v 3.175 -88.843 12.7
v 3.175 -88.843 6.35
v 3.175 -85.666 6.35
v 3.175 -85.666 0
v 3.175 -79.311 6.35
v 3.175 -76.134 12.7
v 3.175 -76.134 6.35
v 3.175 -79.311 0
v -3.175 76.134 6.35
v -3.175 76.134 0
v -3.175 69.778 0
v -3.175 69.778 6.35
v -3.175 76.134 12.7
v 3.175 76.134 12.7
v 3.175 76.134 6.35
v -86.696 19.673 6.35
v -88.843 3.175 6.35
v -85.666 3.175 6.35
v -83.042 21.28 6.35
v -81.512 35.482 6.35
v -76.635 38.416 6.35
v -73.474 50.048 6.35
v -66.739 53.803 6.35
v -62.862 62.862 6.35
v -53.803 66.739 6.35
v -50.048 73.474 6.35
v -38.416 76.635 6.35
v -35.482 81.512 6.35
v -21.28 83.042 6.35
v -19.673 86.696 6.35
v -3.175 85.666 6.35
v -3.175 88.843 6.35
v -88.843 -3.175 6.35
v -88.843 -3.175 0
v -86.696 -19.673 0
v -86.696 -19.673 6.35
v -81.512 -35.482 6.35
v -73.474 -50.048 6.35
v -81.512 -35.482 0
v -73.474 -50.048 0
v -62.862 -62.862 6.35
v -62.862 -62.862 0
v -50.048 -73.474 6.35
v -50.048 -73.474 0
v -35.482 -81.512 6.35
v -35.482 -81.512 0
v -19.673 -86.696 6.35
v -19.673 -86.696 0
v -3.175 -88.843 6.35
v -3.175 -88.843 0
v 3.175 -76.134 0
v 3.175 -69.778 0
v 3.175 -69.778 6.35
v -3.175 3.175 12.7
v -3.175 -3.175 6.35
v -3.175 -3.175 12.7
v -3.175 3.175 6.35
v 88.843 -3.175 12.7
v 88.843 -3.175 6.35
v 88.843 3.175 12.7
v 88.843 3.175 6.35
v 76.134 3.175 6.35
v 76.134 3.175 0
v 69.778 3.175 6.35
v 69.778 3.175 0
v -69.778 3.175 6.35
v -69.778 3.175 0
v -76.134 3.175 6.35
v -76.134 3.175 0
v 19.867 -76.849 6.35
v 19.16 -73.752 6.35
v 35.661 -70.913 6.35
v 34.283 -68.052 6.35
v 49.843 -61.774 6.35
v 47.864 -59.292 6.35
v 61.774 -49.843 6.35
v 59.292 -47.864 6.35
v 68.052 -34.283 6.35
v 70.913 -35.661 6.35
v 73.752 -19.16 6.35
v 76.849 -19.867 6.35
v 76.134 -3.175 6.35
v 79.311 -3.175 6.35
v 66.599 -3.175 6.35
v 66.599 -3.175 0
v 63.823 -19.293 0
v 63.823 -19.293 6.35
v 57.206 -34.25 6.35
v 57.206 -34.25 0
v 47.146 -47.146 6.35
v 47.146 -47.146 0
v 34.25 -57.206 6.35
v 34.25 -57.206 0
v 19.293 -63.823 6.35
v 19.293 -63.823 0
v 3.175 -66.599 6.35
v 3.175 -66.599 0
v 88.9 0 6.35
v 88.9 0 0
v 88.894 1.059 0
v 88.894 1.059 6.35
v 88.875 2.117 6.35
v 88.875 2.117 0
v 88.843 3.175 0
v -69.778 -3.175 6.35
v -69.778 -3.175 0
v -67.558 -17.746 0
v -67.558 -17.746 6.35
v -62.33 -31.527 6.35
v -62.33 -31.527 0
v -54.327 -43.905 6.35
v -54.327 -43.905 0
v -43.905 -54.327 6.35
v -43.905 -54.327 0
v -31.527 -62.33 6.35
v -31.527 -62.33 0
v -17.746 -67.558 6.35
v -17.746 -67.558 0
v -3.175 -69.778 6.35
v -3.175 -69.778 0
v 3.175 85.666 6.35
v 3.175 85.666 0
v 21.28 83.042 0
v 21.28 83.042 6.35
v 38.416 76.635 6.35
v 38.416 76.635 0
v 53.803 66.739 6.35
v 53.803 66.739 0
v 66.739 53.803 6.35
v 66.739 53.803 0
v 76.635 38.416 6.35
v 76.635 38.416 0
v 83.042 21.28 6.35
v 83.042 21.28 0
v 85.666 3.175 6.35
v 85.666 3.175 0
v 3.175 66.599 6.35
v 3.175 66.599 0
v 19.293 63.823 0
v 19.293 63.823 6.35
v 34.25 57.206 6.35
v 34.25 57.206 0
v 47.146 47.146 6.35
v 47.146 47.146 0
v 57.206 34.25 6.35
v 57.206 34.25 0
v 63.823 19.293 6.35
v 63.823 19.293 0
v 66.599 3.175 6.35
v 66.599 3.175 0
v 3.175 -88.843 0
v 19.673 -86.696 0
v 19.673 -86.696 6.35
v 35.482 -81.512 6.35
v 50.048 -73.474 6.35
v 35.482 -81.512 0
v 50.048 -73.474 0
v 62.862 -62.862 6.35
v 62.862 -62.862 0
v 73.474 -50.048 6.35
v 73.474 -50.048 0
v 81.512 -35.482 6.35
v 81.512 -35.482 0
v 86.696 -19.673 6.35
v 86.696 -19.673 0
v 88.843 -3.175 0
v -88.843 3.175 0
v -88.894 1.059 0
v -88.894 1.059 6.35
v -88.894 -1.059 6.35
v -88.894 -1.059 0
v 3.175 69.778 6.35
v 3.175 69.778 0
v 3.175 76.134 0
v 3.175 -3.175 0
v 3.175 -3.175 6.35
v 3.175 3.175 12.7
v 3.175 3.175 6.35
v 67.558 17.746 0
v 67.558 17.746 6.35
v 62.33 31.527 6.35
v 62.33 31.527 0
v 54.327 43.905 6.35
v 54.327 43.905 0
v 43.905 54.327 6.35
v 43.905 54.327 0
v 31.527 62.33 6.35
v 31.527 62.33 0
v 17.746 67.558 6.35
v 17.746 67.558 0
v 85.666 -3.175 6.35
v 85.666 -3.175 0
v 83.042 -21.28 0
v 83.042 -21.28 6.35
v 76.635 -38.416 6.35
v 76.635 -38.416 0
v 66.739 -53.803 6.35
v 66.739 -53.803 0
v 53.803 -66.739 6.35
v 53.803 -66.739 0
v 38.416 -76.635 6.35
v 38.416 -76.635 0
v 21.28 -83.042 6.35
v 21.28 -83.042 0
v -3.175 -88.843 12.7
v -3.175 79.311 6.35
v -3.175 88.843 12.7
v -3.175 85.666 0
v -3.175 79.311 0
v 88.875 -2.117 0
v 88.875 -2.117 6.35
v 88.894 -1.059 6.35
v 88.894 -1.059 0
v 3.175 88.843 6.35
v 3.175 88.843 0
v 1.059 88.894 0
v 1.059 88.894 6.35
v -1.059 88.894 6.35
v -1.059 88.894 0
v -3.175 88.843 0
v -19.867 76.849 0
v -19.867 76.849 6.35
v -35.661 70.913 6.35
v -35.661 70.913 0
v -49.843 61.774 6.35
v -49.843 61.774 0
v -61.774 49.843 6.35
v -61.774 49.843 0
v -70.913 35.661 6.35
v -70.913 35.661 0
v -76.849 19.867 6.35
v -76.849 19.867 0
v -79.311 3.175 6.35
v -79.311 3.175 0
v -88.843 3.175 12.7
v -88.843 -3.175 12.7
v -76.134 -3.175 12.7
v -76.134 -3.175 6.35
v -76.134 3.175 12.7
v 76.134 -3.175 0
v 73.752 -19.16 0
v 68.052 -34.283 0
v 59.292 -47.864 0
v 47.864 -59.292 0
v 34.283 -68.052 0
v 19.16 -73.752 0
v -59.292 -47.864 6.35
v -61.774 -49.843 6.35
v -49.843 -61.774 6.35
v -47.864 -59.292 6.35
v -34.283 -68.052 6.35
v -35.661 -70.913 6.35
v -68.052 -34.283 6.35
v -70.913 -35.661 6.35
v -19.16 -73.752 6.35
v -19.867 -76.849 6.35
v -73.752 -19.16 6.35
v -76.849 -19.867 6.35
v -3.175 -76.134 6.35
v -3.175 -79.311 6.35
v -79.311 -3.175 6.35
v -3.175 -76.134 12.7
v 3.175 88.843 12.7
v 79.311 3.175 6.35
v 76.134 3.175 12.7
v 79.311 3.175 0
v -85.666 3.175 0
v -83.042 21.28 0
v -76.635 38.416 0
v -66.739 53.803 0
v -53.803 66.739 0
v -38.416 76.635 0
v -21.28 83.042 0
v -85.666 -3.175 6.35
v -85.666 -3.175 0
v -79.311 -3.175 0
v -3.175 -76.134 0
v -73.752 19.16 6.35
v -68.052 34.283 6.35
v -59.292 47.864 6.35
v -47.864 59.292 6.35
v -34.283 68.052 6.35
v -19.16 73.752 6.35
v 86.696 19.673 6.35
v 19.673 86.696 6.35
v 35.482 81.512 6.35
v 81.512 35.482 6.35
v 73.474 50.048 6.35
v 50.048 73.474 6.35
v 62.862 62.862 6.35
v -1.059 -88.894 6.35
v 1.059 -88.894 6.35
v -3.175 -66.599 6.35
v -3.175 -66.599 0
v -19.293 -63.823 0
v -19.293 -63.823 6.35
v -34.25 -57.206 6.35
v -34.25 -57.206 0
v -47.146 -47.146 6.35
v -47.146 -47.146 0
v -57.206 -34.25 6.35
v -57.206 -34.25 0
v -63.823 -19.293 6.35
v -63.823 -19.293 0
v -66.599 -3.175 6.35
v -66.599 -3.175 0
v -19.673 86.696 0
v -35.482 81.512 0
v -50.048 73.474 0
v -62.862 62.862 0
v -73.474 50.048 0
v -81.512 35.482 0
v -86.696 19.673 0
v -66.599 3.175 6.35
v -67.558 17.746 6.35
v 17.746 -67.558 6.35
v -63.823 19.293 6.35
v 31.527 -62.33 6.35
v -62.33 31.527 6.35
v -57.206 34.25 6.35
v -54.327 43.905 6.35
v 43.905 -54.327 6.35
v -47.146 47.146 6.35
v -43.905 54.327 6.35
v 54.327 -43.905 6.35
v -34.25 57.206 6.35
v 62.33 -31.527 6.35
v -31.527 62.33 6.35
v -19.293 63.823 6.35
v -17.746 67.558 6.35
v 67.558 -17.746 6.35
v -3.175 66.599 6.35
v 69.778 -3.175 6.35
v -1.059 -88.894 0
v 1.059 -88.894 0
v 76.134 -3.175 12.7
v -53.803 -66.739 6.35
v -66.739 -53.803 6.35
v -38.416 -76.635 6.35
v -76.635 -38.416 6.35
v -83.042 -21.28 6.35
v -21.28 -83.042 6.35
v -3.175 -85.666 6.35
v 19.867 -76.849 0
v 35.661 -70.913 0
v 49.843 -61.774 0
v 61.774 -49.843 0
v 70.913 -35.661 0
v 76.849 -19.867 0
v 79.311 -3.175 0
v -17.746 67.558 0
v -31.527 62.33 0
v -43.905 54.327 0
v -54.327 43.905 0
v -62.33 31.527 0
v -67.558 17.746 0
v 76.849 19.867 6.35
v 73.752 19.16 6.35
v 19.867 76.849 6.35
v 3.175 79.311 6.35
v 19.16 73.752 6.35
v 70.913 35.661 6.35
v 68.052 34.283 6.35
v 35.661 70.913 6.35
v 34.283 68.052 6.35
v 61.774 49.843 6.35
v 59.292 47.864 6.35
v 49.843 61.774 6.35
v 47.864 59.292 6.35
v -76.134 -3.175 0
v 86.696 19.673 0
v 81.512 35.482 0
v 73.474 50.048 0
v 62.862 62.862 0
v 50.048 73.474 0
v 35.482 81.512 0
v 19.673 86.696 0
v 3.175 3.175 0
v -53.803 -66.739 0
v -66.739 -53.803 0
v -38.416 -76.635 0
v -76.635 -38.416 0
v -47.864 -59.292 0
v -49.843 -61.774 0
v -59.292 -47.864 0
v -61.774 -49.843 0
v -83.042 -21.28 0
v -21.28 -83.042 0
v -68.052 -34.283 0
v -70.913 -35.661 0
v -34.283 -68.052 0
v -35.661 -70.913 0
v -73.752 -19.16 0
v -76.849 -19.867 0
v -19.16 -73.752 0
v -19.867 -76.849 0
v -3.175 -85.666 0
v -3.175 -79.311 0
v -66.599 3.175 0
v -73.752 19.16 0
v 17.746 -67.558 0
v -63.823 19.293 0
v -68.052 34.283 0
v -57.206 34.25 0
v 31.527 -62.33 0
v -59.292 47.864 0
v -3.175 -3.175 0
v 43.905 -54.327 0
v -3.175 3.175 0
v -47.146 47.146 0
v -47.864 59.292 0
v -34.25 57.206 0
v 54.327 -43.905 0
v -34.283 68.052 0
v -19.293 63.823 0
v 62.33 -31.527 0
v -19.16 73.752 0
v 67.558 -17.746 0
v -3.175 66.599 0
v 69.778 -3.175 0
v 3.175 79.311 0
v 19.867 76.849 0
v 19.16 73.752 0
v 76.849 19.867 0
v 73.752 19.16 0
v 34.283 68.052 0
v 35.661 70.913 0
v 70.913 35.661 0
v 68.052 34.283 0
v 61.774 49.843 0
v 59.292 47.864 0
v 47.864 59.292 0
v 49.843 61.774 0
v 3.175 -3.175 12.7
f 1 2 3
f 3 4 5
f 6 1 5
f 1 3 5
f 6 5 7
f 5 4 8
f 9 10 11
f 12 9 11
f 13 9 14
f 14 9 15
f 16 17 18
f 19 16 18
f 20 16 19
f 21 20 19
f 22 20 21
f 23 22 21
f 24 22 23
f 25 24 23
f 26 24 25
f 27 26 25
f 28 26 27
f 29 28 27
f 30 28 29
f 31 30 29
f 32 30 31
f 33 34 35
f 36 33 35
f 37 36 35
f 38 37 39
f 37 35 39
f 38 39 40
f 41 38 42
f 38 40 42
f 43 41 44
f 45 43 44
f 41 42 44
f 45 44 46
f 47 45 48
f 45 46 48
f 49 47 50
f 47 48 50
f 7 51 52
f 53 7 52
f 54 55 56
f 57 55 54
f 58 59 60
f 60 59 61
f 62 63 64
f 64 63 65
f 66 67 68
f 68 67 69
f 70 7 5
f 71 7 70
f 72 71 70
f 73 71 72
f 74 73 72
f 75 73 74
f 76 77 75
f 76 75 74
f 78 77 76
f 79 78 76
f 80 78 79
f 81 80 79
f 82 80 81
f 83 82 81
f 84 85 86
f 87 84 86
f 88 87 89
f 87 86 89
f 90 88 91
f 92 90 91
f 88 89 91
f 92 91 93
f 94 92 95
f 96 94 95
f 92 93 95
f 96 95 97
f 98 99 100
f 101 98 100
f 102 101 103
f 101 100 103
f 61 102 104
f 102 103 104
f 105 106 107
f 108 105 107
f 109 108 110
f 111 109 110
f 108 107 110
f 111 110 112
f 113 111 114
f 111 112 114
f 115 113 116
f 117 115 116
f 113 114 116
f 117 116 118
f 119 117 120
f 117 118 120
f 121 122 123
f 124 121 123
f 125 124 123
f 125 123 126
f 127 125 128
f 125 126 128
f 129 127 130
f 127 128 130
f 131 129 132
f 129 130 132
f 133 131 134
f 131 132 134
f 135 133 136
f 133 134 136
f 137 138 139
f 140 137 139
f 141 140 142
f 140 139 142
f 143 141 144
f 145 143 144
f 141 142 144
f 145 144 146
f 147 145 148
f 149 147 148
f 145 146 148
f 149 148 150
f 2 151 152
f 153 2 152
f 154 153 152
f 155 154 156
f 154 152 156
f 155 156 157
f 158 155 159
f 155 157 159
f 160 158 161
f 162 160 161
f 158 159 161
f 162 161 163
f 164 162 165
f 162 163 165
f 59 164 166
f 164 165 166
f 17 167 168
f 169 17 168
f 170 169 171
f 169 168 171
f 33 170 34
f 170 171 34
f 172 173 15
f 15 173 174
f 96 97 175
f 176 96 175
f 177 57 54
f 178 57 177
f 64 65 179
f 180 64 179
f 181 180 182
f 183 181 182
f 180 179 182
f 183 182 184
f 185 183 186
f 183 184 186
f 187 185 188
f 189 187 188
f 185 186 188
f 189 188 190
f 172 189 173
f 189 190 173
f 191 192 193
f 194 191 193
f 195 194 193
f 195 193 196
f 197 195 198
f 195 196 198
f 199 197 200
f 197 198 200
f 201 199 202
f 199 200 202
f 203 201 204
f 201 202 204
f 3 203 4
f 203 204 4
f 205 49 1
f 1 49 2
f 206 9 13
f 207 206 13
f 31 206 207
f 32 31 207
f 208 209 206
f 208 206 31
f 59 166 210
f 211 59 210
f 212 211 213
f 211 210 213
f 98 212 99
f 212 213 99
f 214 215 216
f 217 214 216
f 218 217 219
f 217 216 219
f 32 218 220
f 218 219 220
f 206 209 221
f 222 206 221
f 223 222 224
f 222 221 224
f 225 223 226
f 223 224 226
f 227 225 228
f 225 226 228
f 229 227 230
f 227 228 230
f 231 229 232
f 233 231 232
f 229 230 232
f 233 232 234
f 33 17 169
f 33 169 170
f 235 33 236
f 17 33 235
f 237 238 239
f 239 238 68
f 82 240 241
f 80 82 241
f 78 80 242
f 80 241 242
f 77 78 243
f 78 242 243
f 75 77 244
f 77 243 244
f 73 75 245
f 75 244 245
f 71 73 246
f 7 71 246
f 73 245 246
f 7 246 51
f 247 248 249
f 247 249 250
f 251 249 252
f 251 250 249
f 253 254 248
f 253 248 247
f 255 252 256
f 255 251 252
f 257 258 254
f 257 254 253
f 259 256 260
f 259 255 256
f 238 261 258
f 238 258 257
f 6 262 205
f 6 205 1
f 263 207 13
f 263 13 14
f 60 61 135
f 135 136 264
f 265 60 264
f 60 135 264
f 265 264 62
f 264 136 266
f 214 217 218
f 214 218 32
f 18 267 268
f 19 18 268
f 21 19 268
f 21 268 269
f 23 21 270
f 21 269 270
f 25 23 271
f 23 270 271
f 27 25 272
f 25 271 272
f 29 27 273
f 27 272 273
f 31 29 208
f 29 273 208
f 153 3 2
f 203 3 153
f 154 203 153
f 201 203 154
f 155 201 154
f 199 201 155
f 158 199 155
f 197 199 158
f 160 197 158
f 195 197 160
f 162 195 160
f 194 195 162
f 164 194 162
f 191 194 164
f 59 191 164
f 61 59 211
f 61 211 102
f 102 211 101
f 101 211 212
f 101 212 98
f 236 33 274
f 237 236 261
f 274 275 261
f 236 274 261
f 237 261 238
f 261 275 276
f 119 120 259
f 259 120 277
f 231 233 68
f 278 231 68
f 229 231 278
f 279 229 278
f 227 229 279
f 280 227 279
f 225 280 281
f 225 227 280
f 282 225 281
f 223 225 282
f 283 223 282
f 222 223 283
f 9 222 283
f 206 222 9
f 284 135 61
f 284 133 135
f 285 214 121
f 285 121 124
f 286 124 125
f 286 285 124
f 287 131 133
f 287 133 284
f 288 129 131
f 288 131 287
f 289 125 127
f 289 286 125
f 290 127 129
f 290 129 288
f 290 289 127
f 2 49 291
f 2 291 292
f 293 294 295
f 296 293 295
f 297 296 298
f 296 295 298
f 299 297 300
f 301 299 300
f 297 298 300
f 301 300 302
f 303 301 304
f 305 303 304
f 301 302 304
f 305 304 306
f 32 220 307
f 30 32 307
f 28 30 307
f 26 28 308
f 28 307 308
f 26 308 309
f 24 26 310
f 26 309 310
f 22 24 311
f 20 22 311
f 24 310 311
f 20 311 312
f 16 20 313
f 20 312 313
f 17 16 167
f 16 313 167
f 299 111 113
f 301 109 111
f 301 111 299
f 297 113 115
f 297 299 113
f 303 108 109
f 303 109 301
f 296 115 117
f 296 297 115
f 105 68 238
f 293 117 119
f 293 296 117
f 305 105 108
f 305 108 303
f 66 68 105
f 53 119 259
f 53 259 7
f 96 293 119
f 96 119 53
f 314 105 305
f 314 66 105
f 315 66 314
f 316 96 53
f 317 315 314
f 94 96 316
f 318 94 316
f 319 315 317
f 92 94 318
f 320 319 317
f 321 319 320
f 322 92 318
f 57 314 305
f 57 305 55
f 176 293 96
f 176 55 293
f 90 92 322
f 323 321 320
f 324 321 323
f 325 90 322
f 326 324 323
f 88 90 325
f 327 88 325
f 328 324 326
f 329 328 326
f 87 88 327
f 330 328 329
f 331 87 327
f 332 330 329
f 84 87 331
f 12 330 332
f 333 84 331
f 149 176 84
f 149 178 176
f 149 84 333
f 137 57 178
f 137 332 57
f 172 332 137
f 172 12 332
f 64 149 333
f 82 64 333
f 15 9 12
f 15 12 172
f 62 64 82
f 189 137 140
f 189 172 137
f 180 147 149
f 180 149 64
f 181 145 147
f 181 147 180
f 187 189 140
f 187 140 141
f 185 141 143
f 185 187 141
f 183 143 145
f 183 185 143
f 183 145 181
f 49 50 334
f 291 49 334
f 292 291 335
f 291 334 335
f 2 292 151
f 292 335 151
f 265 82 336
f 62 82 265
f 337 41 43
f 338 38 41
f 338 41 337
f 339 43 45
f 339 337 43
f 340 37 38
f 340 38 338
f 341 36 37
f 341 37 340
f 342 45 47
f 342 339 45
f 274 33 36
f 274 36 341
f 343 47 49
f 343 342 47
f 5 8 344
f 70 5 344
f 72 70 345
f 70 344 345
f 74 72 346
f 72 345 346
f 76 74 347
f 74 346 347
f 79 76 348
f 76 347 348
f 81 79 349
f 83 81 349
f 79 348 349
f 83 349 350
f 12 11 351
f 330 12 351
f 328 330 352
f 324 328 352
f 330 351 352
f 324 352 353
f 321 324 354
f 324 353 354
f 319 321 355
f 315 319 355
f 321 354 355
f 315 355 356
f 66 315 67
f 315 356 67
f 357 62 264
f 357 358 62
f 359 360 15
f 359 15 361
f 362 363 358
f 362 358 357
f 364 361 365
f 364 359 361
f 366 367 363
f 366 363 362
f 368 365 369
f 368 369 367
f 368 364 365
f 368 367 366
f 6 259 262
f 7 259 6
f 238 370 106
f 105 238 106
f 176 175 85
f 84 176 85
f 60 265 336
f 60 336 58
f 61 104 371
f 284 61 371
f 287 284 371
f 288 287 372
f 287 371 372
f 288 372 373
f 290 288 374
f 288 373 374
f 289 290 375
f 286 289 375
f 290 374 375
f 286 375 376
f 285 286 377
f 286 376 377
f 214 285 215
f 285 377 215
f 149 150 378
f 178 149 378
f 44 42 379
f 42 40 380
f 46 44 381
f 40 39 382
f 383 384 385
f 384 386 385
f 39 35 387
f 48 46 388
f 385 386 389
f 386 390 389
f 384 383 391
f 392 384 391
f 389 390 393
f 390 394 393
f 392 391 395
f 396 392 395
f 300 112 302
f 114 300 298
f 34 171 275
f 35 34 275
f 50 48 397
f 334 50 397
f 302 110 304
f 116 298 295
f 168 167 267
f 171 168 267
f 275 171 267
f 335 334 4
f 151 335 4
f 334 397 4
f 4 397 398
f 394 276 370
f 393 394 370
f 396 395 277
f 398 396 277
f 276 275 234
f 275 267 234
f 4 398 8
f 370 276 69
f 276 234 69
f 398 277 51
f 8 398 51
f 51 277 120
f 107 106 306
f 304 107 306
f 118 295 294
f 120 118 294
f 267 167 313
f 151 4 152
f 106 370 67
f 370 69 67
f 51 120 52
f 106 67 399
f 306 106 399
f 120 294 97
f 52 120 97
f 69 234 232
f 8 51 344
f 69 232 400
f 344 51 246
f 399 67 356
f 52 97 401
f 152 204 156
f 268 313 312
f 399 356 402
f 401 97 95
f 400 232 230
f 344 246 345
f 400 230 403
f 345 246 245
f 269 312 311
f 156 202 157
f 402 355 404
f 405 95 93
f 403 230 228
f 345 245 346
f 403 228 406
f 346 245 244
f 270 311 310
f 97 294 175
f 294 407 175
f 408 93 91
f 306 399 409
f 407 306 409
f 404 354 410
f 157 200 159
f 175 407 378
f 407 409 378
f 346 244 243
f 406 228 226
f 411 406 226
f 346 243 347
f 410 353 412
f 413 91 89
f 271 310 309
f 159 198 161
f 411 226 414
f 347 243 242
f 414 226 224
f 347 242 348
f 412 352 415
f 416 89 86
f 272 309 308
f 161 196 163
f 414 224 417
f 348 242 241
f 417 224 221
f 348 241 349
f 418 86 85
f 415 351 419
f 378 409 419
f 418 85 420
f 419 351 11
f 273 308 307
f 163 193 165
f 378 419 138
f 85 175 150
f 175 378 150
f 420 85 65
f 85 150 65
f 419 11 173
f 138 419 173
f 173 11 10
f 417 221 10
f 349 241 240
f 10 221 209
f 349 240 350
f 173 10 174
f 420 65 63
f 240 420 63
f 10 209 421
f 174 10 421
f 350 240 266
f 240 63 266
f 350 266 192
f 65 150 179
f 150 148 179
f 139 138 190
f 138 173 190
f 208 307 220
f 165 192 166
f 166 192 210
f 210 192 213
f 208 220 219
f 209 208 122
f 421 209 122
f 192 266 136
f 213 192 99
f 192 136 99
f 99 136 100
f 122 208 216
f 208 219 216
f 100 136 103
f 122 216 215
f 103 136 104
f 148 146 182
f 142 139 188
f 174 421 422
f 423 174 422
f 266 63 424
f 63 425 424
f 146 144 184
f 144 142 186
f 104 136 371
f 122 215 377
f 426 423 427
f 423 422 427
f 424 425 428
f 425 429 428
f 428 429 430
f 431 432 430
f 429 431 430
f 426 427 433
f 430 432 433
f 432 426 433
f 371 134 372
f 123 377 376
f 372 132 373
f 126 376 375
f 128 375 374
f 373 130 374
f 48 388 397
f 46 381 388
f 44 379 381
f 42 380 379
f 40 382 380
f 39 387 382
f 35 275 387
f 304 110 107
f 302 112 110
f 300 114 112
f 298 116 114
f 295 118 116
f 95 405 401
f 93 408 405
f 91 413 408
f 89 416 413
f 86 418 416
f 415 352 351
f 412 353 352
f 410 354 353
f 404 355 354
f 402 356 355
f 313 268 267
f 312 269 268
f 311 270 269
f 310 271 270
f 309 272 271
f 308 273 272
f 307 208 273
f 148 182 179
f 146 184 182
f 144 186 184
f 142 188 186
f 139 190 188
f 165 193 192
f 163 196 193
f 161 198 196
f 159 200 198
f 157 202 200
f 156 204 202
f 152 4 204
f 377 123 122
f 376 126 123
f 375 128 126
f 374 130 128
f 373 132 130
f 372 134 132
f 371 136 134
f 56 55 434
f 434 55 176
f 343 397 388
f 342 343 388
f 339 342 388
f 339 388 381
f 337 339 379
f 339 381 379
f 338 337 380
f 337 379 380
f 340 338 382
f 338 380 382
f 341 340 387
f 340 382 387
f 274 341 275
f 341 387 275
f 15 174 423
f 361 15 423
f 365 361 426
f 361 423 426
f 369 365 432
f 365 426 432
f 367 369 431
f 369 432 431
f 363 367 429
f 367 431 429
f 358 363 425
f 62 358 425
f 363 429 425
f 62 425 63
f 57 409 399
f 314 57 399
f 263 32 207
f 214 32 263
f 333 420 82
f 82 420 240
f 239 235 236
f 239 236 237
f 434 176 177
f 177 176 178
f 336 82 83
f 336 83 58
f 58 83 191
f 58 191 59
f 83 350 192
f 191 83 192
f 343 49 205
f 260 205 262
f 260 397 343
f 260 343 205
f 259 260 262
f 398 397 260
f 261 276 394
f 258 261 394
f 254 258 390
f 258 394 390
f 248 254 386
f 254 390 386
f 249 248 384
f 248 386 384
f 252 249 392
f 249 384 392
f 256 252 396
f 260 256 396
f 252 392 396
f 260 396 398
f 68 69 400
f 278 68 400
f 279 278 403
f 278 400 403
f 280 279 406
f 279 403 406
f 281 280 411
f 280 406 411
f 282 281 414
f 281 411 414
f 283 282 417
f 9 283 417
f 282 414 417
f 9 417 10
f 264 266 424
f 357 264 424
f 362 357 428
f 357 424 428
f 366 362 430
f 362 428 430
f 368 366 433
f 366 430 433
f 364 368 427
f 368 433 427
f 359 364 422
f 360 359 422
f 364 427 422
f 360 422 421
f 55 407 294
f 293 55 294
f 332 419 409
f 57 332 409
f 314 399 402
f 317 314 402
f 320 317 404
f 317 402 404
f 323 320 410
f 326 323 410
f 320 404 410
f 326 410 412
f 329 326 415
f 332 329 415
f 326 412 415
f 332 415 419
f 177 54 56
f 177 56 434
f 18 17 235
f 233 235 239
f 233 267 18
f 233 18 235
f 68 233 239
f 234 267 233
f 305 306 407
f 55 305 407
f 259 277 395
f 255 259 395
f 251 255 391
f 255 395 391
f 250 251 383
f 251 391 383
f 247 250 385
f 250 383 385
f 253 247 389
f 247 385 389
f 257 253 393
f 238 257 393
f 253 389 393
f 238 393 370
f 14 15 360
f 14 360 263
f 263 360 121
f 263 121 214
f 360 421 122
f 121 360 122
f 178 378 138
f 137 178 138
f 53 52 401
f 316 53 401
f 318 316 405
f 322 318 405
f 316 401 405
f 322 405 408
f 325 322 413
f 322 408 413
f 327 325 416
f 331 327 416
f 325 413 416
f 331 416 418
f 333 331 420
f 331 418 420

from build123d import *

# Parameters (mm, degrees)
F0_W     = 6.35
F0_H     = 6.35
F1_DEPTH = 6.35
F2_W     = 12.7094600481
F2_H     = 6.35
F2_W_2   = 6.35
F2_H_2   = 12.7094600481
F3_DEPTH = 6.35


with BuildPart() as f1:
    # F0 (on Top) → F1 (new body)
    with BuildSketch(Plane.XY):
        with BuildLine():
            ThreePointArc((88.8432854807, -3.175), (88.8858202393, -1.5877532504), (88.9, 0))
            ThreePointArc((88.9, 0), (88.8858202393, 1.5877532504), (88.8432854807, 3.175))
            Line((88.8432854807, 3.175), (88.8432854807, -3.175))
        make_face()
        with BuildLine():
            Line((85.6661835265, 3.175), (88.8432854807, 3.175))
            ThreePointArc((88.8432854807, 3.175), (62.8617928475, 62.8617928475), (3.175, 88.8432854807))
            Line((3.175, 88.8432854807), (3.175, 85.6661835265))
            ThreePointArc((3.175, 85.6661835265), (60.6167288172, 60.6167288172), (85.6661835265, 3.175))
        make_face()
        with BuildLine():
            Line((88.8432854807, -3.175), (88.8432854807, 3.175))
            Line((88.8432854807, 3.175), (85.6661835265, 3.175))
            ThreePointArc((85.6661835265, 3.175), (85.7102946203, 1.5877723686), (85.725, 0))
            ThreePointArc((85.725, 0), (85.7102946203, -1.5877723686), (85.6661835265, -3.175))
            Line((85.6661835265, -3.175), (88.8432854807, -3.175))
        make_face()
        with BuildLine():
            ThreePointArc((3.175, -88.8432854807), (62.8617928475, -62.8617928475), (88.8432854807, -3.175))
            Line((88.8432854807, -3.175), (85.6661835265, -3.175))
            ThreePointArc((85.6661835265, -3.175), (60.6167288172, -60.6167288172), (3.175, -85.6661835265))
            Line((3.175, -85.6661835265), (3.175, -88.8432854807))
        make_face()
        with BuildLine():
            Line((-3.175, 88.8432854807), (3.175, 88.8432854807))
            ThreePointArc((3.175, 88.8432854807), (0, 88.9), (-3.175, 88.8432854807))
        make_face()
        with BuildLine():
            Line((3.175, 85.6661835265), (3.175, 88.8432854807))
            Line((3.175, 88.8432854807), (-3.175, 88.8432854807))
            Line((-3.175, 88.8432854807), (-3.175, 85.6661835265))
            ThreePointArc((-3.175, 85.6661835265), (0, 85.725), (3.175, 85.6661835265))
        make_face()
        with BuildLine():
            ThreePointArc((-3.175, -88.8432854807), (0, -88.9), (3.175, -88.8432854807))
            Line((3.175, -88.8432854807), (-3.175, -88.8432854807))
        make_face()
        with BuildLine():
            Line((-3.175, -88.8432854807), (3.175, -88.8432854807))
            Line((3.175, -88.8432854807), (3.175, -85.6661835265))
            ThreePointArc((3.175, -85.6661835265), (0, -85.725), (-3.175, -85.6661835265))
            Line((-3.175, -85.6661835265), (-3.175, -88.8432854807))
        make_face()
        with BuildLine():
            Line((-3.175, 85.6661835265), (-3.175, 88.8432854807))
            ThreePointArc((-3.175, 88.8432854807), (-62.8617928475, 62.8617928475), (-88.8432854807, 3.175))
            Line((-88.8432854807, 3.175), (-85.6661835265, 3.175))
            ThreePointArc((-85.6661835265, 3.175), (-60.6167288172, 60.6167288172), (-3.175, 85.6661835265))
        make_face()
        with BuildLine():
            ThreePointArc((-88.8432854807, -3.175), (-62.8617928475, -62.8617928475), (-3.175, -88.8432854807))
            Line((-3.175, -88.8432854807), (-3.175, -85.6661835265))
            ThreePointArc((-3.175, -85.6661835265), (-60.6167288172, -60.6167288172), (-85.6661835265, -3.175))
            Line((-85.6661835265, -3.175), (-88.8432854807, -3.175))
        make_face()
        with BuildLine():
            Line((-88.8432854807, -3.175), (-88.8432854807, 3.175))
            ThreePointArc((-88.8432854807, 3.175), (-88.9, 0), (-88.8432854807, -3.175))
        make_face()
        with BuildLine():
            Line((-85.6661835265, 3.175), (-88.8432854807, 3.175))
            Line((-88.8432854807, 3.175), (-88.8432854807, -3.175))
            Line((-88.8432854807, -3.175), (-85.6661835265, -3.175))
            ThreePointArc((-85.6661835265, -3.175), (-85.725, 0), (-85.6661835265, 3.175))
        make_face()
        with BuildLine():
            Line((-3.175, 76.1338254326), (-3.175, 79.3114745797))
            ThreePointArc((-3.175, 79.3114745797), (-56.1266007567, 56.1266007567), (-79.3114745797, 3.175))
            Line((-79.3114745797, 3.175), (-76.1338254326, 3.175))
            ThreePointArc((-76.1338254326, 3.175), (-53.8815367264, 53.8815367264), (-3.175, 76.1338254326))
        make_face()
        with BuildLine():
            ThreePointArc((-79.3114745797, -3.175), (-56.1266007567, -56.1266007567), (-3.175, -79.3114745797))
            Line((-3.175, -79.3114745797), (-3.175, -76.1338254326))
            ThreePointArc((-3.175, -76.1338254326), (-53.8815367264, -53.8815367264), (-76.1338254326, -3.175))
            Line((-76.1338254326, -3.175), (-79.3114745797, -3.175))
        make_face()
        with BuildLine():
            Line((-76.1338254326, 3.175), (-79.3114745797, 3.175))
            ThreePointArc((-79.3114745797, 3.175), (-79.375, 0), (-79.3114745797, -3.175))
            Line((-79.3114745797, -3.175), (-76.1338254326, -3.175))
            ThreePointArc((-76.1338254326, -3.175), (-76.2, 0), (-76.1338254326, 3.175))
        make_face()
        with BuildLine():
            Line((-79.3114745797, 3.175), (-85.6661835265, 3.175))
            ThreePointArc((-85.6661835265, 3.175), (-85.725, 0), (-85.6661835265, -3.175))
            Line((-85.6661835265, -3.175), (-79.3114745797, -3.175))
            ThreePointArc((-79.3114745797, -3.175), (-79.375, 0), (-79.3114745797, 3.175))
        make_face()
        with BuildLine():
            Line((-66.5993618588, 3.175), (-69.7778035983, 3.175))
            ThreePointArc((-69.7778035983, 3.175), (-69.85, 0), (-69.7778035983, -3.175))
            Line((-69.7778035983, -3.175), (-66.5993618588, -3.175))
            ThreePointArc((-66.5993618588, -3.175), (-66.675, 0), (-66.5993618588, 3.175))
        make_face()
        with BuildLine():
            Line((-3.175, 66.5993618588), (-3.175, 69.7778035983))
            ThreePointArc((-3.175, 69.7778035983), (-49.3914086659, 49.3914086659), (-69.7778035983, 3.175))
            Line((-69.7778035983, 3.175), (-66.5993618588, 3.175))
            ThreePointArc((-66.5993618588, 3.175), (-47.1463446356, 47.1463446356), (-3.175, 66.5993618588))
        make_face()
        with BuildLine():
            ThreePointArc((-69.7778035983, -3.175), (-49.3914086659, -49.3914086659), (-3.175, -69.7778035983))
            Line((-3.175, -69.7778035983), (-3.175, -66.5993618588))
            ThreePointArc((-3.175, -66.5993618588), (-47.1463446356, -47.1463446356), (-66.5993618588, -3.175))
            Line((-66.5993618588, -3.175), (-69.7778035983, -3.175))
        make_face()
        with BuildLine():
            ThreePointArc((-3.175, -69.7778035983), (0, -69.85), (3.175, -69.7778035983))
            Line((3.175, -69.7778035983), (3.175, -66.5993618588))
            ThreePointArc((3.175, -66.5993618588), (0, -66.675), (-3.175, -66.5993618588))
            Line((-3.175, -66.5993618588), (-3.175, -69.7778035983))
        make_face()
        with BuildLine():
            ThreePointArc((-3.175, -79.3114745797), (0, -79.375), (3.175, -79.3114745797))
            Line((3.175, -79.3114745797), (3.175, -76.1338254326))
            ThreePointArc((3.175, -76.1338254326), (0, -76.2), (-3.175, -76.1338254326))
            Line((-3.175, -76.1338254326), (-3.175, -79.3114745797))
        make_face()
        with BuildLine():
            ThreePointArc((3.175, -79.3114745797), (56.1266007567, -56.1266007567), (79.3114745797, -3.175))
            Line((79.3114745797, -3.175), (76.1338254326, -3.175))
            ThreePointArc((76.1338254326, -3.175), (53.8815367264, -53.8815367264), (3.175, -76.1338254326))
            Line((3.175, -76.1338254326), (3.175, -79.3114745797))
        make_face()
        with BuildLine():
            ThreePointArc((3.175, -69.7778035983), (49.3914086659, -49.3914086659), (69.7778035983, -3.175))
            Line((69.7778035983, -3.175), (66.5993618588, -3.175))
            ThreePointArc((66.5993618588, -3.175), (47.1463446356, -47.1463446356), (3.175, -66.5993618588))
            Line((3.175, -66.5993618588), (3.175, -69.7778035983))
        make_face()
        with BuildLine():
            ThreePointArc((69.85, 0), (69.831948567, 1.5879103659), (69.7778035983, 3.175))
            Line((69.7778035983, 3.175), (66.5993618588, 3.175))
            ThreePointArc((66.5993618588, 3.175), (66.6560877825, 1.5879504187), (66.675, 0))
            ThreePointArc((66.675, 0), (66.6560877825, -1.5879504187), (66.5993618588, -3.175))
            Line((66.5993618588, -3.175), (69.7778035983, -3.175))
            ThreePointArc((69.7778035983, -3.175), (69.831948567, -1.5879103659), (69.85, 0))
        make_face()
        with BuildLine():
            Line((76.1338254326, 3.175), (79.3114745797, 3.175))
            ThreePointArc((79.3114745797, 3.175), (56.1266007567, 56.1266007567), (3.175, 79.3114745797))
            Line((3.175, 79.3114745797), (3.175, 76.1338254326))
            ThreePointArc((3.175, 76.1338254326), (53.8815367264, 53.8815367264), (76.1338254326, 3.175))
        make_face()
        with BuildLine():
            Line((66.5993618588, 3.175), (69.7778035983, 3.175))
            ThreePointArc((69.7778035983, 3.175), (49.3914086659, 49.3914086659), (3.175, 69.7778035983))
            Line((3.175, 69.7778035983), (3.175, 66.5993618588))
            ThreePointArc((3.175, 66.5993618588), (47.1463446356, 47.1463446356), (66.5993618588, 3.175))
        make_face()
        with BuildLine():
            Line((3.175, 76.1338254326), (3.175, 79.3114745797))
            ThreePointArc((3.175, 79.3114745797), (0, 79.375), (-3.175, 79.3114745797))
            Line((-3.175, 79.3114745797), (-3.175, 76.1338254326))
            ThreePointArc((-3.175, 76.1338254326), (0, 76.2), (3.175, 76.1338254326))
        make_face()
        with BuildLine():
            Line((3.175, 66.5993618588), (3.175, 69.7778035983))
            ThreePointArc((3.175, 69.7778035983), (0, 69.85), (-3.175, 69.7778035983))
            Line((-3.175, 69.7778035983), (-3.175, 66.5993618588))
            ThreePointArc((-3.175, 66.5993618588), (0, 66.675), (3.175, 66.5993618588))
        make_face()
        with BuildLine():
            Line((-3.175, -3.175), (-3.175, 3.175))
            Line((-3.175, 3.175), (-66.5993618588, 3.175))
            ThreePointArc((-66.5993618588, 3.175), (-66.675, 0), (-66.5993618588, -3.175))
            Line((-66.5993618588, -3.175), (-3.175, -3.175))
        make_face()
        with BuildLine():
            Line((3.175, 3.175), (3.175, 66.5993618588))
            ThreePointArc((3.175, 66.5993618588), (0, 66.675), (-3.175, 66.5993618588))
            Line((-3.175, 66.5993618588), (-3.175, 3.175))
            Line((-3.175, 3.175), (3.175, 3.175))
        make_face()
        with BuildLine():
            ThreePointArc((66.675, 0), (66.6560877825, 1.5879504187), (66.5993618588, 3.175))
            Line((66.5993618588, 3.175), (3.175, 3.175))
            Line((3.175, 3.175), (3.175, -3.175))
            Line((3.175, -3.175), (66.5993618588, -3.175))
            ThreePointArc((66.5993618588, -3.175), (66.6560877825, -1.5879504187), (66.675, 0))
        make_face()
        with BuildLine():
            ThreePointArc((-3.175, -66.5993618588), (0, -66.675), (3.175, -66.5993618588))
            Line((3.175, -66.5993618588), (3.175, -3.175))
            Line((3.175, -3.175), (-3.175, -3.175))
            Line((-3.175, -3.175), (-3.175, -66.5993618588))
        make_face()
        Rectangle(F0_W, F0_H)
        with BuildLine():
            ThreePointArc((-3.175, -76.1338254326), (0, -76.2), (3.175, -76.1338254326))
            Line((3.175, -76.1338254326), (3.175, -69.7778035983))
            ThreePointArc((3.175, -69.7778035983), (0, -69.85), (-3.175, -69.7778035983))
            Line((-3.175, -69.7778035983), (-3.175, -76.1338254326))
        make_face()
        with BuildLine():
            ThreePointArc((-3.175, -85.6661835265), (0, -85.725), (3.175, -85.6661835265))
            Line((3.175, -85.6661835265), (3.175, -79.3114745797))
            ThreePointArc((3.175, -79.3114745797), (0, -79.375), (-3.175, -79.3114745797))
            Line((-3.175, -79.3114745797), (-3.175, -85.6661835265))
        make_face()
        with BuildLine():
            Line((3.175, 69.7778035983), (3.175, 76.1338254326))
            ThreePointArc((3.175, 76.1338254326), (0, 76.2), (-3.175, 76.1338254326))
            Line((-3.175, 76.1338254326), (-3.175, 69.7778035983))
            ThreePointArc((-3.175, 69.7778035983), (0, 69.85), (3.175, 69.7778035983))
        make_face()
        with BuildLine():
            Line((3.175, 79.3114745797), (3.175, 85.6661835265))
            ThreePointArc((3.175, 85.6661835265), (0, 85.725), (-3.175, 85.6661835265))
            Line((-3.175, 85.6661835265), (-3.175, 79.3114745797))
            ThreePointArc((-3.175, 79.3114745797), (0, 79.375), (3.175, 79.3114745797))
        make_face()
        with BuildLine():
            Line((-69.7778035983, 3.175), (-76.1338254326, 3.175))
            ThreePointArc((-76.1338254326, 3.175), (-76.2, 0), (-76.1338254326, -3.175))
            Line((-76.1338254326, -3.175), (-69.7778035983, -3.175))
            ThreePointArc((-69.7778035983, -3.175), (-69.85, 0), (-69.7778035983, 3.175))
        make_face()
        with BuildLine():
            ThreePointArc((76.2, 0), (76.1834545619, 1.5878447715), (76.1338254326, 3.175))
            Line((76.1338254326, 3.175), (69.7778035983, 3.175))
            ThreePointArc((69.7778035983, 3.175), (69.831948567, 1.5879103659), (69.85, 0))
            ThreePointArc((69.85, 0), (69.831948567, -1.5879103659), (69.7778035983, -3.175))
            Line((69.7778035983, -3.175), (76.1338254326, -3.175))
            ThreePointArc((76.1338254326, -3.175), (76.1834545619, -1.5878447715), (76.2, 0))
        make_face()
        with BuildLine():
            ThreePointArc((79.375, 0), (79.3591170558, 1.5878177225), (79.3114745797, 3.175))
            Line((79.3114745797, 3.175), (76.1338254326, 3.175))
            ThreePointArc((76.1338254326, 3.175), (76.1834545619, 1.5878447715), (76.2, 0))
            ThreePointArc((76.2, 0), (76.1834545619, -1.5878447715), (76.1338254326, -3.175))
            Line((76.1338254326, -3.175), (79.3114745797, -3.175))
            ThreePointArc((79.3114745797, -3.175), (79.3591170558, -1.5878177225), (79.375, 0))
        make_face()
        with BuildLine():
            ThreePointArc((85.725, 0), (85.7102946203, 1.5877723686), (85.6661835265, 3.175))
            Line((85.6661835265, 3.175), (79.3114745797, 3.175))
            ThreePointArc((79.3114745797, 3.175), (79.3591170558, 1.5878177225), (79.375, 0))
            ThreePointArc((79.375, 0), (79.3591170558, -1.5878177225), (79.3114745797, -3.175))
            Line((79.3114745797, -3.175), (85.6661835265, -3.175))
            ThreePointArc((85.6661835265, -3.175), (85.7102946203, -1.5877723686), (85.725, 0))
        make_face()
    extrude(amount=F1_DEPTH)

    # F2 (on face) → F3 (join)
    with BuildSketch(Plane.XY.offset(6.35)):
        with Locations((-82.4885554566, 0)):
            Rectangle(F2_W, F2_H)
        with Locations((82.4885554566, 0)):
            Rectangle(F2_W, F2_H)
        with Locations((0, 82.4885554566)):
            Rectangle(F2_W_2, F2_H_2)
        with Locations((0, -82.4885554566)):
            Rectangle(F2_W_2, F2_H_2)
        Rectangle(F2_W_2, F2_H)
    extrude(amount=F3_DEPTH)


solid = f1.part
